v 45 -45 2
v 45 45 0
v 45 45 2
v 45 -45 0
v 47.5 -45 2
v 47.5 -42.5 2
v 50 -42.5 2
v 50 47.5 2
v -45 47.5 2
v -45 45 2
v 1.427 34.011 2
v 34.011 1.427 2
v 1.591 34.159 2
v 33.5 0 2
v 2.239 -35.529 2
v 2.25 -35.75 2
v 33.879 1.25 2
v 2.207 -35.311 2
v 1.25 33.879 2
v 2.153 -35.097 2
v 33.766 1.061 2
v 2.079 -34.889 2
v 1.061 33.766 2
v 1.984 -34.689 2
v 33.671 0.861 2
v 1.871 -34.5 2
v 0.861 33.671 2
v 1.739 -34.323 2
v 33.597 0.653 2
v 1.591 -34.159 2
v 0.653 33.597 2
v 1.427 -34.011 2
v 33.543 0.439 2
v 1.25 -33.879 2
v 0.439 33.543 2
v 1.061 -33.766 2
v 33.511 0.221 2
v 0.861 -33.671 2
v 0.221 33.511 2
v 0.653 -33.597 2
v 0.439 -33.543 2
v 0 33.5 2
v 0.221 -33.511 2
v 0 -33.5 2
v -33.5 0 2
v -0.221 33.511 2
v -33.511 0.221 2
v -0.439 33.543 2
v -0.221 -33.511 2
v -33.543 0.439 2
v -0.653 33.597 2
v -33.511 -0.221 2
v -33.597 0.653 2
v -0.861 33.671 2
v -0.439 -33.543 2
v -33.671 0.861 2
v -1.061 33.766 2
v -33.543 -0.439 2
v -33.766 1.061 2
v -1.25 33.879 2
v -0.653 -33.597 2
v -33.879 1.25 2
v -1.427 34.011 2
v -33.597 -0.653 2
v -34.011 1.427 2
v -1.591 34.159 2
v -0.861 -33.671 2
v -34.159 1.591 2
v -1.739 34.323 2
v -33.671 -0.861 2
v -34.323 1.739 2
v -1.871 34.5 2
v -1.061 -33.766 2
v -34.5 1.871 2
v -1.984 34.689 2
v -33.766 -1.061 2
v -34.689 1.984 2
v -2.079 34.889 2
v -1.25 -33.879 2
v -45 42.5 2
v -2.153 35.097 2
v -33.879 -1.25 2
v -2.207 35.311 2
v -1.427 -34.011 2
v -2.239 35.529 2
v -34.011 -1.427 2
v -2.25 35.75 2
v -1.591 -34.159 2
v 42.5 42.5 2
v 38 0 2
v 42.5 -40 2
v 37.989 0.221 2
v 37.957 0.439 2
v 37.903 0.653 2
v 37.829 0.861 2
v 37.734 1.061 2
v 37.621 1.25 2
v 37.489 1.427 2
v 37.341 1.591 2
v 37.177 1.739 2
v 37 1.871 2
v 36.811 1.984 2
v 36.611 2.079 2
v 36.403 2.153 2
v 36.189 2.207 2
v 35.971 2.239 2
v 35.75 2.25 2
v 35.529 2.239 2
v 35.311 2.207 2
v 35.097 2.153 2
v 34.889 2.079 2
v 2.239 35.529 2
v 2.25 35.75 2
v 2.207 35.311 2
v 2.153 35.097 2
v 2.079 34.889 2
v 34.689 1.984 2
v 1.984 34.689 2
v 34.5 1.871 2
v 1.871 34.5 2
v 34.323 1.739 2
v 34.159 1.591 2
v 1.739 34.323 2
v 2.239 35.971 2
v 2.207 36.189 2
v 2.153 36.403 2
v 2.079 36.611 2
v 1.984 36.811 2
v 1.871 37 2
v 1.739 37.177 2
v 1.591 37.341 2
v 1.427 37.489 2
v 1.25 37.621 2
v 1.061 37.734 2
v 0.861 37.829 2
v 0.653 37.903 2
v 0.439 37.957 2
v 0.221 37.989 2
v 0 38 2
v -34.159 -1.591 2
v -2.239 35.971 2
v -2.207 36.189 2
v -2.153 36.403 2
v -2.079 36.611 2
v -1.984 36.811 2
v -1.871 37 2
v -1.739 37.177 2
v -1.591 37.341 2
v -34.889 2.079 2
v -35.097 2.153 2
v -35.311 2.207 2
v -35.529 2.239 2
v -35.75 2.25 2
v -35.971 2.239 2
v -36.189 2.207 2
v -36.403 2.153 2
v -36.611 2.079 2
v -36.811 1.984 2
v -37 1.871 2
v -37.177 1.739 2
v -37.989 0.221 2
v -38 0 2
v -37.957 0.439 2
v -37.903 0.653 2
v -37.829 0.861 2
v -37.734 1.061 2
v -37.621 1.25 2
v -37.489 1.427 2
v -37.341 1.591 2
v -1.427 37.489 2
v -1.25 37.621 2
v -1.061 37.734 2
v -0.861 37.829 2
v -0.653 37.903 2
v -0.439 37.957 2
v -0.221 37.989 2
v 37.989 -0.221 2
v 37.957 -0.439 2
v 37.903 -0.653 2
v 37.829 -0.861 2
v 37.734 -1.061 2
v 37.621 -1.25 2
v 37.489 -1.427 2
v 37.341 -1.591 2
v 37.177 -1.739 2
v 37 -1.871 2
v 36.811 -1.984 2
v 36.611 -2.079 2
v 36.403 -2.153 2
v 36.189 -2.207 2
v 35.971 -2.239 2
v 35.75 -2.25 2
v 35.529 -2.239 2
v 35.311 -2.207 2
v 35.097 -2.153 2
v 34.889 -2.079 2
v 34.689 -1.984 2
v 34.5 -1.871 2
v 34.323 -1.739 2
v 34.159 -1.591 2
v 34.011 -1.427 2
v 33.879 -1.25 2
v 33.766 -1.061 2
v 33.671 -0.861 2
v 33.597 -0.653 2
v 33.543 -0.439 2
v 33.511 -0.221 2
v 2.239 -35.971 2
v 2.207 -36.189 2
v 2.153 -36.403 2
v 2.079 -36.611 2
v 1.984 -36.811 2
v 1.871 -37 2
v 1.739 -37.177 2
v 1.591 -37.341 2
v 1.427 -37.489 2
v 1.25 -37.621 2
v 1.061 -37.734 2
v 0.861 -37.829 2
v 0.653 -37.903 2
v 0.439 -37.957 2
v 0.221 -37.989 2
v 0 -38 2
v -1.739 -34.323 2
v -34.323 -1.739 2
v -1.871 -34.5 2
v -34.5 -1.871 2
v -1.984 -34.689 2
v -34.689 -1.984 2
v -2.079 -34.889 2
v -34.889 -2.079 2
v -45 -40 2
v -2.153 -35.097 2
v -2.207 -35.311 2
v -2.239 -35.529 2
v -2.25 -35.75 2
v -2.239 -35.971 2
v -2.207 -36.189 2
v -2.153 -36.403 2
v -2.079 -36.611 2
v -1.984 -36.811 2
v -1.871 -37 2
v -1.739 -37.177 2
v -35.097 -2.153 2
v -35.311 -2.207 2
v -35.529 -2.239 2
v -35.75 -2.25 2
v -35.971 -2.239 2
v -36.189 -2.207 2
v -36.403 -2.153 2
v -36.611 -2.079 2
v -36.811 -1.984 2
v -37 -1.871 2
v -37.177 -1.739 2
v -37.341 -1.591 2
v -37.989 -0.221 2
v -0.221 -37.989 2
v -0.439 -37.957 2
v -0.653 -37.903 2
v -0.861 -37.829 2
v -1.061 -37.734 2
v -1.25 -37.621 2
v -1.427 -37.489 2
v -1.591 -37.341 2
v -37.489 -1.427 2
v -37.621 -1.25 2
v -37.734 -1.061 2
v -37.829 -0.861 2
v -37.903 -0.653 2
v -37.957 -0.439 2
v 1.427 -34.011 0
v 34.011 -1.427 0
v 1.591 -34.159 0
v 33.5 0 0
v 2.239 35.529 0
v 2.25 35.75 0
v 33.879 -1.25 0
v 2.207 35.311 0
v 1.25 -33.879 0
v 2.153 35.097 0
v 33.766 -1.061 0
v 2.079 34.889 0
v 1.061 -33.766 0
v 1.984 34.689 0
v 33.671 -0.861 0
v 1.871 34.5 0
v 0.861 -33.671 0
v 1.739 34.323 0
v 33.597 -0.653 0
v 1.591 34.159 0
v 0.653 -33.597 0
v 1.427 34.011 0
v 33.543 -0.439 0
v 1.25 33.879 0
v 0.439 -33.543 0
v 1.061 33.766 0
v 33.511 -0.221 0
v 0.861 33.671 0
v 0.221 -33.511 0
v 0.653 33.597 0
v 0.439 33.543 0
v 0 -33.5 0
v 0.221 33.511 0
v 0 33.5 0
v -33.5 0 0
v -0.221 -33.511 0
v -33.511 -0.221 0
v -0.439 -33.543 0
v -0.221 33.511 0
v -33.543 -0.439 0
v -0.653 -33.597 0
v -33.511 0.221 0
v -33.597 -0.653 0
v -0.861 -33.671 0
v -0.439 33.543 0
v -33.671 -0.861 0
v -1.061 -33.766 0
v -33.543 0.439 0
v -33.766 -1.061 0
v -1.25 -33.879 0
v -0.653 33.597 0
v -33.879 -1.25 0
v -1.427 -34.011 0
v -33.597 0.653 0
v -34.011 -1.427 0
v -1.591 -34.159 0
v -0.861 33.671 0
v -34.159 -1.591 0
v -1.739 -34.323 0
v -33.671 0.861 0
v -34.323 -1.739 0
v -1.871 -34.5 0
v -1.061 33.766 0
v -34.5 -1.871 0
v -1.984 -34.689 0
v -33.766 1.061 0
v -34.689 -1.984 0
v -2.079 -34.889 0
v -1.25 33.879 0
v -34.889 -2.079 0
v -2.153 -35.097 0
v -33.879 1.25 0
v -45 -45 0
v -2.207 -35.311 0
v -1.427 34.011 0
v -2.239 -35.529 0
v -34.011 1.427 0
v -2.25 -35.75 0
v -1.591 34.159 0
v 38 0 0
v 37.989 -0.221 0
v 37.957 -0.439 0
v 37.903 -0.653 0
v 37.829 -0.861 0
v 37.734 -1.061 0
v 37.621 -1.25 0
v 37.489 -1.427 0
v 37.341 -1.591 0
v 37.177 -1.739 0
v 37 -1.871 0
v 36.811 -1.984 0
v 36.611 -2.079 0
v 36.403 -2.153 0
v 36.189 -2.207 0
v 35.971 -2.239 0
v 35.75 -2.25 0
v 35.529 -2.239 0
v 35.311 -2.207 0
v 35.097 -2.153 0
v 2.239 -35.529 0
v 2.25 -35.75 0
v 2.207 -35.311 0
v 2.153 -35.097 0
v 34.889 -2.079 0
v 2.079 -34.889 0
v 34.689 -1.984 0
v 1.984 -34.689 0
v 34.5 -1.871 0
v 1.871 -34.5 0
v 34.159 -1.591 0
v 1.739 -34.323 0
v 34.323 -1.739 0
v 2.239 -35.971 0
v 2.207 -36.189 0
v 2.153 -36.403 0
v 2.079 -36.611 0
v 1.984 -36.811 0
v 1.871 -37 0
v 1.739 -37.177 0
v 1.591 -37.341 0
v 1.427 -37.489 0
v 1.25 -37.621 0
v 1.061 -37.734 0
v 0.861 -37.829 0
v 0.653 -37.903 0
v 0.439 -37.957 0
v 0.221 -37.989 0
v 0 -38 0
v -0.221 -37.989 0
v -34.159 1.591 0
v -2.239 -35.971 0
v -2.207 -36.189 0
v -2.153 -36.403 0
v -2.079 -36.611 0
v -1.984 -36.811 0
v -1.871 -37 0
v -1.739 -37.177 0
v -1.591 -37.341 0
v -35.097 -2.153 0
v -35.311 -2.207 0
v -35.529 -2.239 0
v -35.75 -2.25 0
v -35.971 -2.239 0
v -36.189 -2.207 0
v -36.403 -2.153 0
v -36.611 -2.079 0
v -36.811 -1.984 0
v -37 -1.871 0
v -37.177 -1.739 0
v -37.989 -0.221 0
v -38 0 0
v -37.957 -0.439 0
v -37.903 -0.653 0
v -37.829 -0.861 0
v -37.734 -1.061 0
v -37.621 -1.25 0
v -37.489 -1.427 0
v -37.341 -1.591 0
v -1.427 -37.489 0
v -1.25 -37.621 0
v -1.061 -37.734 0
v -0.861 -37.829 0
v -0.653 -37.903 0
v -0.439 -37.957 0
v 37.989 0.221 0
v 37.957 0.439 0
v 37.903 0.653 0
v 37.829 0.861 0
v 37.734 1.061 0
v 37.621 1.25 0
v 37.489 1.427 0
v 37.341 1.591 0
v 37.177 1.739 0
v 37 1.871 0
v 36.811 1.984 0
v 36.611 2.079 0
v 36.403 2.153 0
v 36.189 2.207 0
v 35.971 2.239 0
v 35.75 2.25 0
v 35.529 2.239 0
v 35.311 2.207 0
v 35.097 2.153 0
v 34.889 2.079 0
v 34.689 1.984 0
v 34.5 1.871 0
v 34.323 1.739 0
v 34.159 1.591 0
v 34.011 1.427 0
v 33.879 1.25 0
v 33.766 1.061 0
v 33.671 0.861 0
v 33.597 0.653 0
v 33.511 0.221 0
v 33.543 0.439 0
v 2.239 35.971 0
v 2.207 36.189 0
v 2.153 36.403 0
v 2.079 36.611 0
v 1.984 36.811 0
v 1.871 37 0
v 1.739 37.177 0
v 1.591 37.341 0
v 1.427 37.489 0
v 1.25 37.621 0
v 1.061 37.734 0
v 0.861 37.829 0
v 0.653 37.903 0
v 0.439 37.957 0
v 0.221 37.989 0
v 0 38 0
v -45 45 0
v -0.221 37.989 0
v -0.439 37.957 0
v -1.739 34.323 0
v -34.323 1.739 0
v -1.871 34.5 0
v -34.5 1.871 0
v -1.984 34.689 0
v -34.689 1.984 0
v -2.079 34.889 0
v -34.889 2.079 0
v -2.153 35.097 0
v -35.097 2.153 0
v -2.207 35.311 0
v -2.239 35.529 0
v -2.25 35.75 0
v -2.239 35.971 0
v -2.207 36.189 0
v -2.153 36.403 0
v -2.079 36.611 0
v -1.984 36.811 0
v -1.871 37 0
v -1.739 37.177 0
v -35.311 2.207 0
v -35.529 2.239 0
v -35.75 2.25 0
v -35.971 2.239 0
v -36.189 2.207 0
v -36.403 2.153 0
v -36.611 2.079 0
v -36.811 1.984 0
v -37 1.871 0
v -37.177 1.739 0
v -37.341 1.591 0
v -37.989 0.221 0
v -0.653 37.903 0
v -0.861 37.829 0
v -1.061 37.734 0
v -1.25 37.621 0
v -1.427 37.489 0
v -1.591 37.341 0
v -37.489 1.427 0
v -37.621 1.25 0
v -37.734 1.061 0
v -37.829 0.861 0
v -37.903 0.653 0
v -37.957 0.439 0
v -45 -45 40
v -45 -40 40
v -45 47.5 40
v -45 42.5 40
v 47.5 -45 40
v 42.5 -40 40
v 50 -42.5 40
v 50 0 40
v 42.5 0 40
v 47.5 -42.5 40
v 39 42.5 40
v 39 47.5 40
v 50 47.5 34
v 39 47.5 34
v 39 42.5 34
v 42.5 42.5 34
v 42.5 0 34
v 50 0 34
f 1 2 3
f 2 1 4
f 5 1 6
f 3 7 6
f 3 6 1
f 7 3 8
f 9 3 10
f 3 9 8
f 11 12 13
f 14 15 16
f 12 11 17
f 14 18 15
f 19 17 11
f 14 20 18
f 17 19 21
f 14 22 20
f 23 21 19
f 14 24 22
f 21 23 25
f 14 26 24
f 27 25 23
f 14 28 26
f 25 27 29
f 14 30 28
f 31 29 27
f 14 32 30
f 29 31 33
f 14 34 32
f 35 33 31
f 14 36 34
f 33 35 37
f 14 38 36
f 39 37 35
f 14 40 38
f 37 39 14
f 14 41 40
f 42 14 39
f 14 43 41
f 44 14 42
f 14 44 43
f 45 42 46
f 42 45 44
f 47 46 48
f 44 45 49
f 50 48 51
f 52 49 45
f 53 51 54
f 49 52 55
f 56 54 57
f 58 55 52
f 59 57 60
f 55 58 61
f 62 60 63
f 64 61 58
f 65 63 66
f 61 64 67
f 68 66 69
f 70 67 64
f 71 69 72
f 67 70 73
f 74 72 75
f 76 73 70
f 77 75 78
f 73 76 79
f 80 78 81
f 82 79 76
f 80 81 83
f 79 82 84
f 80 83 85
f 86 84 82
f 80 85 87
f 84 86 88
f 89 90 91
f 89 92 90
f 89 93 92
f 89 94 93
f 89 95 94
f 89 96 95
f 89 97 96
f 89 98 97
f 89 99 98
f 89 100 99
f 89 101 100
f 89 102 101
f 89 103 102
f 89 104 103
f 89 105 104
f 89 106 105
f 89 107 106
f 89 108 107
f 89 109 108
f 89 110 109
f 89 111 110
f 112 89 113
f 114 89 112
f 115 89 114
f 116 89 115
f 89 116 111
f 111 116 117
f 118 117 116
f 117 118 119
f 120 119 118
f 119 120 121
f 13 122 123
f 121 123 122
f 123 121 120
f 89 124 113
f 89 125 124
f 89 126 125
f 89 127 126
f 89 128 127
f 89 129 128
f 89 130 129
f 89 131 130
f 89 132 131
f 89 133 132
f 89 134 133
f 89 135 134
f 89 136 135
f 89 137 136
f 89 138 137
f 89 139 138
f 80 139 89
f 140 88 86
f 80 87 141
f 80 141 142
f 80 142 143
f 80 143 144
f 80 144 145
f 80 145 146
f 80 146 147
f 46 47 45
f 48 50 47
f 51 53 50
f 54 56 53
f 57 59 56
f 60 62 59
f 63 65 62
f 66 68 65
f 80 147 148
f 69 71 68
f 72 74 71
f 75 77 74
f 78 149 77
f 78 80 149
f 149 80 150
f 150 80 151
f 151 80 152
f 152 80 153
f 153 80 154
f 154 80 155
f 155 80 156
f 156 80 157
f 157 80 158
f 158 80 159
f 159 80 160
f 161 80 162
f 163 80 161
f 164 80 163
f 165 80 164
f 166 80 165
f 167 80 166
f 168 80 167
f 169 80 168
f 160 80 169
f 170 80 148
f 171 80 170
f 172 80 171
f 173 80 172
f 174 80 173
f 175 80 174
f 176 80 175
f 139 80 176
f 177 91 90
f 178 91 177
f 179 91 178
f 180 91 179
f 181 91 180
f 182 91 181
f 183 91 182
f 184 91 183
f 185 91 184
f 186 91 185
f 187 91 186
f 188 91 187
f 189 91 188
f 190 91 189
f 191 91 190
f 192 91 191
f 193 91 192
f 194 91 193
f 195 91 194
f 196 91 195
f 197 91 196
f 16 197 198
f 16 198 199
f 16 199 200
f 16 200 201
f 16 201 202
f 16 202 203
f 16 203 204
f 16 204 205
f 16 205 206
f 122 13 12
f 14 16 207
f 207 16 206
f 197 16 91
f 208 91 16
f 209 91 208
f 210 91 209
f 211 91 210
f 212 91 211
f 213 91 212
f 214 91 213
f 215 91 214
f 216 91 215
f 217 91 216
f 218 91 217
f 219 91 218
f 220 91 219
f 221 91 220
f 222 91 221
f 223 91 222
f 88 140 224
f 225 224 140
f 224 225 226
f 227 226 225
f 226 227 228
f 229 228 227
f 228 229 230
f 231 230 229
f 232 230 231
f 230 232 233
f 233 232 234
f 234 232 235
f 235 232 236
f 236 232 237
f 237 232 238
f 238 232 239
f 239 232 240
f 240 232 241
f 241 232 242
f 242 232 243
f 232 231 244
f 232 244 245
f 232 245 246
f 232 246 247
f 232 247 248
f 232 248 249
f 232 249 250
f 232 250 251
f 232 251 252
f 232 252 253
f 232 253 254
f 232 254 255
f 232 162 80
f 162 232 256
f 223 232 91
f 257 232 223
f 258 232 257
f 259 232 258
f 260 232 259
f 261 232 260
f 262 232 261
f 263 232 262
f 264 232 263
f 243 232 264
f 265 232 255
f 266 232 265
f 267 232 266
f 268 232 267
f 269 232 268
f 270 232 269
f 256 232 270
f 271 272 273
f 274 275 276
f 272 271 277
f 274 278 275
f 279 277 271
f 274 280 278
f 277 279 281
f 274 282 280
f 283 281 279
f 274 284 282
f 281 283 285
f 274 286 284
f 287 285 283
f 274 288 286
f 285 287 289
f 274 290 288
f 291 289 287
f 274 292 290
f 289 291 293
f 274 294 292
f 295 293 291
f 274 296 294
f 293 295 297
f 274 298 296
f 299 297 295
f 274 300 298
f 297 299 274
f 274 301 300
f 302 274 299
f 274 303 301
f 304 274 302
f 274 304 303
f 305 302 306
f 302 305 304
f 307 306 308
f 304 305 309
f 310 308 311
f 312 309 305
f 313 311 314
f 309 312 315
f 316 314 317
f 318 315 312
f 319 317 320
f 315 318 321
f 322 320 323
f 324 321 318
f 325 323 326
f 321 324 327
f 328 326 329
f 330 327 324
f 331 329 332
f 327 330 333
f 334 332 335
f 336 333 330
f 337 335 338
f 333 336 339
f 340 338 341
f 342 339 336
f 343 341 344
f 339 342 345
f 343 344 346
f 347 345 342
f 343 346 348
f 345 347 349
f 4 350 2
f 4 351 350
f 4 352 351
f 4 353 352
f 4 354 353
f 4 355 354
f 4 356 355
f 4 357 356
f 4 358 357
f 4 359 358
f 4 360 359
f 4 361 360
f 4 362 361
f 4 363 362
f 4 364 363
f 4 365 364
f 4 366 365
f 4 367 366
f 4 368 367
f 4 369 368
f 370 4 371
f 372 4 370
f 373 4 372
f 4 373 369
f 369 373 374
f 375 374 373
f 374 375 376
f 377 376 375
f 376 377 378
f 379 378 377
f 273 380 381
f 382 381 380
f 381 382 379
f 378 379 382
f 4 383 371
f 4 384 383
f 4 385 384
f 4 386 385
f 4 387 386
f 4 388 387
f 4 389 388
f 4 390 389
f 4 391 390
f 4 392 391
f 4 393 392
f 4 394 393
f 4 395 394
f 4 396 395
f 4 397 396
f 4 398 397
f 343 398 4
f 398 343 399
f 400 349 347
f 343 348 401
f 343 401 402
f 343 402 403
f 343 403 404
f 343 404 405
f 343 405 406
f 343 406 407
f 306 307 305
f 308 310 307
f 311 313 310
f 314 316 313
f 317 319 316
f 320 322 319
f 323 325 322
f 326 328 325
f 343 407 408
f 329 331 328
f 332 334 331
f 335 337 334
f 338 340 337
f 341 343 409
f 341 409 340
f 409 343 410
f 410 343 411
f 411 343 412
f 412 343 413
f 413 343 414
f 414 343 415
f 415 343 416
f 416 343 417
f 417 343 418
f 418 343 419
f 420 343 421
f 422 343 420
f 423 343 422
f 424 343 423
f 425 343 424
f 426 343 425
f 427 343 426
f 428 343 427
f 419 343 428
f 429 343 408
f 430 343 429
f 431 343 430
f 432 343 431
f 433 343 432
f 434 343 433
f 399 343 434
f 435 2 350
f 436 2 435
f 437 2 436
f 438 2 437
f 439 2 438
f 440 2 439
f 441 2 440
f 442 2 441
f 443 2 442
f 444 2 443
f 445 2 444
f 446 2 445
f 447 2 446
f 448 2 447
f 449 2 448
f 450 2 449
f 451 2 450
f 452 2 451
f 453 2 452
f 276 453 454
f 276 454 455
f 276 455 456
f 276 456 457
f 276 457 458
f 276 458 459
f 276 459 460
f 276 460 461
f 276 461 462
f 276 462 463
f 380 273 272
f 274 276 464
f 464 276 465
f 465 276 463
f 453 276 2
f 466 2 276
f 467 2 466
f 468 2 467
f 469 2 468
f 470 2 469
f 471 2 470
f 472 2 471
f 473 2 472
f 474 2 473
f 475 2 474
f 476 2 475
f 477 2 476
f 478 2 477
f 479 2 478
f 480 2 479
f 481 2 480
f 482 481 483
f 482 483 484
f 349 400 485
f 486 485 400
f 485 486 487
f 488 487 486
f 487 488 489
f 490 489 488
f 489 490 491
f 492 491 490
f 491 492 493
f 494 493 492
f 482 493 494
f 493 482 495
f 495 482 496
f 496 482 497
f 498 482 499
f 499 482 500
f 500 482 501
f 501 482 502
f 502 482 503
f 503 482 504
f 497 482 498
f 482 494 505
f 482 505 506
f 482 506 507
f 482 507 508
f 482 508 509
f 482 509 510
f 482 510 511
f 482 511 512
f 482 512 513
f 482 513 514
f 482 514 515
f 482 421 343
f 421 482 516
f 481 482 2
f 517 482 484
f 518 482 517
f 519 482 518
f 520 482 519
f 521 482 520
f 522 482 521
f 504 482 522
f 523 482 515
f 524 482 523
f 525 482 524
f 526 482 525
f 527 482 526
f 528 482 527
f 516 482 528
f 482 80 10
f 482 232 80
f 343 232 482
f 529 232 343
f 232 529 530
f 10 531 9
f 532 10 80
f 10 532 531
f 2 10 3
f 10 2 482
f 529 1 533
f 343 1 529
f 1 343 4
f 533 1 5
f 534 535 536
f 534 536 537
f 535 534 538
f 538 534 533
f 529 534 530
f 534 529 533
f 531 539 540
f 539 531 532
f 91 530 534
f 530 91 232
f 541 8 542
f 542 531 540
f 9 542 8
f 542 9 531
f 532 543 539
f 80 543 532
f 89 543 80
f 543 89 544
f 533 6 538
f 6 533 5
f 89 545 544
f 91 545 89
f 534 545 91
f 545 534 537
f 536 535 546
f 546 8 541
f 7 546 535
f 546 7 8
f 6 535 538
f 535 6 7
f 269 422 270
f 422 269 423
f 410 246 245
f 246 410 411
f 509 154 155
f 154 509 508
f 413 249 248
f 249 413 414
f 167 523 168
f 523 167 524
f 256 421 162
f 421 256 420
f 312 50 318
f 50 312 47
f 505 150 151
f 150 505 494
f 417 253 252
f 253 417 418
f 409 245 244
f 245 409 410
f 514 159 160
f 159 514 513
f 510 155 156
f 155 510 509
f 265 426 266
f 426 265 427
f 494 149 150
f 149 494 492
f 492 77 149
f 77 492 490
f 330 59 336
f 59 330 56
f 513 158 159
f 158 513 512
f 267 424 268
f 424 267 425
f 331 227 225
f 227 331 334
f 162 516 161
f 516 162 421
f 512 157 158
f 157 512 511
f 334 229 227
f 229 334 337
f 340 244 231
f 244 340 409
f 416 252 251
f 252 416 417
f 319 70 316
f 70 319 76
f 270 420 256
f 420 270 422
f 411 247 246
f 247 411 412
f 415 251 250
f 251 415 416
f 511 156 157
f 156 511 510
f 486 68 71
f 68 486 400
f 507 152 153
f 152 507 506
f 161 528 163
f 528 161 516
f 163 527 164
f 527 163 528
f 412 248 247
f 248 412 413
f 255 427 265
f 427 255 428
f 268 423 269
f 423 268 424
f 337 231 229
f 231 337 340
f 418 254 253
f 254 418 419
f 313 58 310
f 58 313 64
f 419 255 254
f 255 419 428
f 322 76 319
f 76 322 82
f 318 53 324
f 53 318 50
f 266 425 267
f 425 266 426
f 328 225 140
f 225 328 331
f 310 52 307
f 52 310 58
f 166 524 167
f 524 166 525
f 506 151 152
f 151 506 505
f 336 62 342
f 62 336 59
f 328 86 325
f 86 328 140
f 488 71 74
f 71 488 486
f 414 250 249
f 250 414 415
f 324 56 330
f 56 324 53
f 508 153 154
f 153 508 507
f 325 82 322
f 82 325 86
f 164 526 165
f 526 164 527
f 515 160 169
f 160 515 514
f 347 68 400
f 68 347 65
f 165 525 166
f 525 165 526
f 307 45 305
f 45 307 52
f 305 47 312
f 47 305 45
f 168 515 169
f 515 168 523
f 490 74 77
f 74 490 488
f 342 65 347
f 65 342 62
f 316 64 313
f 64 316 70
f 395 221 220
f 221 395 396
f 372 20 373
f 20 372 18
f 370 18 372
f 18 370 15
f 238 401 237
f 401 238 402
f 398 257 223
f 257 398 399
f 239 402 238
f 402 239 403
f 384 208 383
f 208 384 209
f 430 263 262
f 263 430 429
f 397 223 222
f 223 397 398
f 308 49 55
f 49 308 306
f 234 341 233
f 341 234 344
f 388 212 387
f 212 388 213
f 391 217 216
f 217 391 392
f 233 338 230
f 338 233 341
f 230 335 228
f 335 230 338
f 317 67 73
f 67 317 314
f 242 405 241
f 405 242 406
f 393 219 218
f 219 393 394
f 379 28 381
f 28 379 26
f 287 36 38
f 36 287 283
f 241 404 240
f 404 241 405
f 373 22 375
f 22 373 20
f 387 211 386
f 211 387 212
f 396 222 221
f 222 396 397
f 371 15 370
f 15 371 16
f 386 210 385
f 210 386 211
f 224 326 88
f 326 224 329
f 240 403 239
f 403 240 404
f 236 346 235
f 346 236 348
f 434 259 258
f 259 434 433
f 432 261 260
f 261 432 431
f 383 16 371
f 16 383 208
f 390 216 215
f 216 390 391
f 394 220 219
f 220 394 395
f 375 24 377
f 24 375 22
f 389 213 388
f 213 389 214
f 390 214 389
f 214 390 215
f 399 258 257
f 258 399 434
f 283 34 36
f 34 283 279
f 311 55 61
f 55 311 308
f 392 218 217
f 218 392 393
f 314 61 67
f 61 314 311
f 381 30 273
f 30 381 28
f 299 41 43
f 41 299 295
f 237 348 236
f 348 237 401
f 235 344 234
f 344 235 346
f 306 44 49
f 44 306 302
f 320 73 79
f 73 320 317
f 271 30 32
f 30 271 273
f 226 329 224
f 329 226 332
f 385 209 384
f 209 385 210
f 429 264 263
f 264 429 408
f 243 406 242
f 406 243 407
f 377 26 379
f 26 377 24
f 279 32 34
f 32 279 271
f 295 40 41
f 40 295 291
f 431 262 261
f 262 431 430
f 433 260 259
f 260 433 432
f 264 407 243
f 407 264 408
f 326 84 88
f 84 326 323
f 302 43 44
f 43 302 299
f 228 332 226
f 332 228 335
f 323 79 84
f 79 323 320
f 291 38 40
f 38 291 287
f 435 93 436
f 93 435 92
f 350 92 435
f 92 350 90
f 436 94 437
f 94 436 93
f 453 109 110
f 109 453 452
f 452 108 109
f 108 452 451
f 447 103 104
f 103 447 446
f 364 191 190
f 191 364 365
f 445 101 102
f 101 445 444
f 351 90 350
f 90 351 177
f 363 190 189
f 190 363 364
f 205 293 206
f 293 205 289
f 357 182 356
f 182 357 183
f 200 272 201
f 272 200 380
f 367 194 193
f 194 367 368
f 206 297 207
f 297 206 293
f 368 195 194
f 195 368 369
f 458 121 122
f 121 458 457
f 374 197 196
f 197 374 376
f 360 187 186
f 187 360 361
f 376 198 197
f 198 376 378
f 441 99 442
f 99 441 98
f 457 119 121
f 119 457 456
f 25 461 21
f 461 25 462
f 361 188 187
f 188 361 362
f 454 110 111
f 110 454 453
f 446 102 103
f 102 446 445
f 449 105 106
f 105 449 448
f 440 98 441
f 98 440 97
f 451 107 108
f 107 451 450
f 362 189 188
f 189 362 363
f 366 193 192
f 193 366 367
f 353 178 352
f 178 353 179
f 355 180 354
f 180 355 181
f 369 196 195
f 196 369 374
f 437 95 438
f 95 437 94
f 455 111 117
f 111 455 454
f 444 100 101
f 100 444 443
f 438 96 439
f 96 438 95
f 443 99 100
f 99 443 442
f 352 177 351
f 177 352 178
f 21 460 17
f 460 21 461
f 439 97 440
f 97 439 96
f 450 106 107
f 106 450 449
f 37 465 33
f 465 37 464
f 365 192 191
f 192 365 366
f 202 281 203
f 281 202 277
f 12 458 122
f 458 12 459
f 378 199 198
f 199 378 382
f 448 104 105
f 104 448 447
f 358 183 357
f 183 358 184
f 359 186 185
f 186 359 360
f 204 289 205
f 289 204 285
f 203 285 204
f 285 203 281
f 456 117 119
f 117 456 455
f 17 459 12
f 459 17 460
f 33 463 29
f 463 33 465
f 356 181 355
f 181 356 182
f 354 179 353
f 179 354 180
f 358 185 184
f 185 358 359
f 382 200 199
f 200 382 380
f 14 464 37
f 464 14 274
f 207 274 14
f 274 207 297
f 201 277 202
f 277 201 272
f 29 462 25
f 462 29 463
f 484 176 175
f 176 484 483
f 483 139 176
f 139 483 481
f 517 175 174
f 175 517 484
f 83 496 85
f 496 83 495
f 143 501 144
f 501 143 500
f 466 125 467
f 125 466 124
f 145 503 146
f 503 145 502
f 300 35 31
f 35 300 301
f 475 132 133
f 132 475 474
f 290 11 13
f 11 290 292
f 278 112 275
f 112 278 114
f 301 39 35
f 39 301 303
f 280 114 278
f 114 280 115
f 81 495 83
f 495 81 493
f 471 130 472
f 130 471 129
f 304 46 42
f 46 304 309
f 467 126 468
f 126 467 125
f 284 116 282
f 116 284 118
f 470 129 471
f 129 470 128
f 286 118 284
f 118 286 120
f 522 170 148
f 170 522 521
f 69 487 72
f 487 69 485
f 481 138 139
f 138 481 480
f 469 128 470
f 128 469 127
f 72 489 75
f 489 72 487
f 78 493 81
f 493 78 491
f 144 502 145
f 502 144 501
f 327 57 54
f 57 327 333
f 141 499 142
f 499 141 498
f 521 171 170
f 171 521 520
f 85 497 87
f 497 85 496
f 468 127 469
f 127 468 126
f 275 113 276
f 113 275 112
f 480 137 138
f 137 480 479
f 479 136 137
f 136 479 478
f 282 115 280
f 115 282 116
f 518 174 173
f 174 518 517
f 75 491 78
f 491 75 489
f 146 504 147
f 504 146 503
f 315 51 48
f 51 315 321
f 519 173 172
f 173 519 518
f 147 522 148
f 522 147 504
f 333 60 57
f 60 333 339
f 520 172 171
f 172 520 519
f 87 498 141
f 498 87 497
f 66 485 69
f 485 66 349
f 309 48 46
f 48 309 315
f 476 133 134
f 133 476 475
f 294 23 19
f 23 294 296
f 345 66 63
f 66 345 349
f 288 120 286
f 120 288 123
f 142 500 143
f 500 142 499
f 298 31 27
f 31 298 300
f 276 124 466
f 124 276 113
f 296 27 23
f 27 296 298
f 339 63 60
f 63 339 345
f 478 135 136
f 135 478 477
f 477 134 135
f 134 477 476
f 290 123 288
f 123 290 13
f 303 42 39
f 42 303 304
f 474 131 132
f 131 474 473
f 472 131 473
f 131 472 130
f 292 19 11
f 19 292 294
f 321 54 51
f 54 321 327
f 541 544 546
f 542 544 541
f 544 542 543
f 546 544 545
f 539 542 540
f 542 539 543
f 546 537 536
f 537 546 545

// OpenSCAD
// Housing for a DIY magnetic stirrer built around an 80 mm PC case fan
// Printed upside down: top plate on the bed, walls rising upward, box open at the top.

$fn = 64;

// ---- Dimensions (mm) ----
top_t      = 2;    // top plate thickness (z = 0 to 2)
wall_t     = 2.5;  // wall thickness
box_h      = 40;   // total height of walls (open top at z = 40)
outer_s    = 90;   // outer size along X and Y
screw_s    = 4.5;  // M4 screw hole diameter
n_screws   = 4;    // number of screw holes
screw_pitch = 71.5;// square pitch between screw holes (X and Y)
cable_w    = 12;   // width of the power-cable notch
cable_reach = 8;   // notch depth from the open edge (z = 32 to 40)

// ---- Model ----
difference() {
    union() {
        // Top plate lying on the bed
        translate([-outer_s/2, -outer_s/2, 0])
            cube([outer_s, outer_s, top_t]);
        // Four walls rising from the plate
        translate([-outer_s/2, -outer_s/2, top_t])
            cube([outer_s, 2*wall_t, box_h - top_t]);       // back wall
        translate([-outer_s/2, outer_s/2 - wall_t, top_t])
            cube([outer_s, 2*wall_t, box_h - top_t]);       // front wall
        translate([outer_s/2 - wall_t, -outer_s/2, top_t])
            cube([2*wall_t, outer_s, box_h - top_t]);       // left wall
        translate([outer_s/2, -outer_s/2 + wall_t, top_t])
            cube([2*wall_t, outer_s, box_h - top_t]);       // right wall
    }

    // Four M4 screw holes through the top plate, centred on the plate
    for (i = [0 : n_screws - 1]) {
        angle = (i - 2) * 90;
        translate([0, 0, -1])
            rotate([0, 0, angle])
                translate([screw_pitch/2, 0, 0])
                    cylinder(d = screw_s, h = top_t + 2);
    }

    // Power-cable notch in one wall, centred along the wall
    translate([outer_s/2 - cable_w/2, 0, top_t + box_h - cable_reach])
        cube([cable_w, outer_s, cable_reach]);
}
